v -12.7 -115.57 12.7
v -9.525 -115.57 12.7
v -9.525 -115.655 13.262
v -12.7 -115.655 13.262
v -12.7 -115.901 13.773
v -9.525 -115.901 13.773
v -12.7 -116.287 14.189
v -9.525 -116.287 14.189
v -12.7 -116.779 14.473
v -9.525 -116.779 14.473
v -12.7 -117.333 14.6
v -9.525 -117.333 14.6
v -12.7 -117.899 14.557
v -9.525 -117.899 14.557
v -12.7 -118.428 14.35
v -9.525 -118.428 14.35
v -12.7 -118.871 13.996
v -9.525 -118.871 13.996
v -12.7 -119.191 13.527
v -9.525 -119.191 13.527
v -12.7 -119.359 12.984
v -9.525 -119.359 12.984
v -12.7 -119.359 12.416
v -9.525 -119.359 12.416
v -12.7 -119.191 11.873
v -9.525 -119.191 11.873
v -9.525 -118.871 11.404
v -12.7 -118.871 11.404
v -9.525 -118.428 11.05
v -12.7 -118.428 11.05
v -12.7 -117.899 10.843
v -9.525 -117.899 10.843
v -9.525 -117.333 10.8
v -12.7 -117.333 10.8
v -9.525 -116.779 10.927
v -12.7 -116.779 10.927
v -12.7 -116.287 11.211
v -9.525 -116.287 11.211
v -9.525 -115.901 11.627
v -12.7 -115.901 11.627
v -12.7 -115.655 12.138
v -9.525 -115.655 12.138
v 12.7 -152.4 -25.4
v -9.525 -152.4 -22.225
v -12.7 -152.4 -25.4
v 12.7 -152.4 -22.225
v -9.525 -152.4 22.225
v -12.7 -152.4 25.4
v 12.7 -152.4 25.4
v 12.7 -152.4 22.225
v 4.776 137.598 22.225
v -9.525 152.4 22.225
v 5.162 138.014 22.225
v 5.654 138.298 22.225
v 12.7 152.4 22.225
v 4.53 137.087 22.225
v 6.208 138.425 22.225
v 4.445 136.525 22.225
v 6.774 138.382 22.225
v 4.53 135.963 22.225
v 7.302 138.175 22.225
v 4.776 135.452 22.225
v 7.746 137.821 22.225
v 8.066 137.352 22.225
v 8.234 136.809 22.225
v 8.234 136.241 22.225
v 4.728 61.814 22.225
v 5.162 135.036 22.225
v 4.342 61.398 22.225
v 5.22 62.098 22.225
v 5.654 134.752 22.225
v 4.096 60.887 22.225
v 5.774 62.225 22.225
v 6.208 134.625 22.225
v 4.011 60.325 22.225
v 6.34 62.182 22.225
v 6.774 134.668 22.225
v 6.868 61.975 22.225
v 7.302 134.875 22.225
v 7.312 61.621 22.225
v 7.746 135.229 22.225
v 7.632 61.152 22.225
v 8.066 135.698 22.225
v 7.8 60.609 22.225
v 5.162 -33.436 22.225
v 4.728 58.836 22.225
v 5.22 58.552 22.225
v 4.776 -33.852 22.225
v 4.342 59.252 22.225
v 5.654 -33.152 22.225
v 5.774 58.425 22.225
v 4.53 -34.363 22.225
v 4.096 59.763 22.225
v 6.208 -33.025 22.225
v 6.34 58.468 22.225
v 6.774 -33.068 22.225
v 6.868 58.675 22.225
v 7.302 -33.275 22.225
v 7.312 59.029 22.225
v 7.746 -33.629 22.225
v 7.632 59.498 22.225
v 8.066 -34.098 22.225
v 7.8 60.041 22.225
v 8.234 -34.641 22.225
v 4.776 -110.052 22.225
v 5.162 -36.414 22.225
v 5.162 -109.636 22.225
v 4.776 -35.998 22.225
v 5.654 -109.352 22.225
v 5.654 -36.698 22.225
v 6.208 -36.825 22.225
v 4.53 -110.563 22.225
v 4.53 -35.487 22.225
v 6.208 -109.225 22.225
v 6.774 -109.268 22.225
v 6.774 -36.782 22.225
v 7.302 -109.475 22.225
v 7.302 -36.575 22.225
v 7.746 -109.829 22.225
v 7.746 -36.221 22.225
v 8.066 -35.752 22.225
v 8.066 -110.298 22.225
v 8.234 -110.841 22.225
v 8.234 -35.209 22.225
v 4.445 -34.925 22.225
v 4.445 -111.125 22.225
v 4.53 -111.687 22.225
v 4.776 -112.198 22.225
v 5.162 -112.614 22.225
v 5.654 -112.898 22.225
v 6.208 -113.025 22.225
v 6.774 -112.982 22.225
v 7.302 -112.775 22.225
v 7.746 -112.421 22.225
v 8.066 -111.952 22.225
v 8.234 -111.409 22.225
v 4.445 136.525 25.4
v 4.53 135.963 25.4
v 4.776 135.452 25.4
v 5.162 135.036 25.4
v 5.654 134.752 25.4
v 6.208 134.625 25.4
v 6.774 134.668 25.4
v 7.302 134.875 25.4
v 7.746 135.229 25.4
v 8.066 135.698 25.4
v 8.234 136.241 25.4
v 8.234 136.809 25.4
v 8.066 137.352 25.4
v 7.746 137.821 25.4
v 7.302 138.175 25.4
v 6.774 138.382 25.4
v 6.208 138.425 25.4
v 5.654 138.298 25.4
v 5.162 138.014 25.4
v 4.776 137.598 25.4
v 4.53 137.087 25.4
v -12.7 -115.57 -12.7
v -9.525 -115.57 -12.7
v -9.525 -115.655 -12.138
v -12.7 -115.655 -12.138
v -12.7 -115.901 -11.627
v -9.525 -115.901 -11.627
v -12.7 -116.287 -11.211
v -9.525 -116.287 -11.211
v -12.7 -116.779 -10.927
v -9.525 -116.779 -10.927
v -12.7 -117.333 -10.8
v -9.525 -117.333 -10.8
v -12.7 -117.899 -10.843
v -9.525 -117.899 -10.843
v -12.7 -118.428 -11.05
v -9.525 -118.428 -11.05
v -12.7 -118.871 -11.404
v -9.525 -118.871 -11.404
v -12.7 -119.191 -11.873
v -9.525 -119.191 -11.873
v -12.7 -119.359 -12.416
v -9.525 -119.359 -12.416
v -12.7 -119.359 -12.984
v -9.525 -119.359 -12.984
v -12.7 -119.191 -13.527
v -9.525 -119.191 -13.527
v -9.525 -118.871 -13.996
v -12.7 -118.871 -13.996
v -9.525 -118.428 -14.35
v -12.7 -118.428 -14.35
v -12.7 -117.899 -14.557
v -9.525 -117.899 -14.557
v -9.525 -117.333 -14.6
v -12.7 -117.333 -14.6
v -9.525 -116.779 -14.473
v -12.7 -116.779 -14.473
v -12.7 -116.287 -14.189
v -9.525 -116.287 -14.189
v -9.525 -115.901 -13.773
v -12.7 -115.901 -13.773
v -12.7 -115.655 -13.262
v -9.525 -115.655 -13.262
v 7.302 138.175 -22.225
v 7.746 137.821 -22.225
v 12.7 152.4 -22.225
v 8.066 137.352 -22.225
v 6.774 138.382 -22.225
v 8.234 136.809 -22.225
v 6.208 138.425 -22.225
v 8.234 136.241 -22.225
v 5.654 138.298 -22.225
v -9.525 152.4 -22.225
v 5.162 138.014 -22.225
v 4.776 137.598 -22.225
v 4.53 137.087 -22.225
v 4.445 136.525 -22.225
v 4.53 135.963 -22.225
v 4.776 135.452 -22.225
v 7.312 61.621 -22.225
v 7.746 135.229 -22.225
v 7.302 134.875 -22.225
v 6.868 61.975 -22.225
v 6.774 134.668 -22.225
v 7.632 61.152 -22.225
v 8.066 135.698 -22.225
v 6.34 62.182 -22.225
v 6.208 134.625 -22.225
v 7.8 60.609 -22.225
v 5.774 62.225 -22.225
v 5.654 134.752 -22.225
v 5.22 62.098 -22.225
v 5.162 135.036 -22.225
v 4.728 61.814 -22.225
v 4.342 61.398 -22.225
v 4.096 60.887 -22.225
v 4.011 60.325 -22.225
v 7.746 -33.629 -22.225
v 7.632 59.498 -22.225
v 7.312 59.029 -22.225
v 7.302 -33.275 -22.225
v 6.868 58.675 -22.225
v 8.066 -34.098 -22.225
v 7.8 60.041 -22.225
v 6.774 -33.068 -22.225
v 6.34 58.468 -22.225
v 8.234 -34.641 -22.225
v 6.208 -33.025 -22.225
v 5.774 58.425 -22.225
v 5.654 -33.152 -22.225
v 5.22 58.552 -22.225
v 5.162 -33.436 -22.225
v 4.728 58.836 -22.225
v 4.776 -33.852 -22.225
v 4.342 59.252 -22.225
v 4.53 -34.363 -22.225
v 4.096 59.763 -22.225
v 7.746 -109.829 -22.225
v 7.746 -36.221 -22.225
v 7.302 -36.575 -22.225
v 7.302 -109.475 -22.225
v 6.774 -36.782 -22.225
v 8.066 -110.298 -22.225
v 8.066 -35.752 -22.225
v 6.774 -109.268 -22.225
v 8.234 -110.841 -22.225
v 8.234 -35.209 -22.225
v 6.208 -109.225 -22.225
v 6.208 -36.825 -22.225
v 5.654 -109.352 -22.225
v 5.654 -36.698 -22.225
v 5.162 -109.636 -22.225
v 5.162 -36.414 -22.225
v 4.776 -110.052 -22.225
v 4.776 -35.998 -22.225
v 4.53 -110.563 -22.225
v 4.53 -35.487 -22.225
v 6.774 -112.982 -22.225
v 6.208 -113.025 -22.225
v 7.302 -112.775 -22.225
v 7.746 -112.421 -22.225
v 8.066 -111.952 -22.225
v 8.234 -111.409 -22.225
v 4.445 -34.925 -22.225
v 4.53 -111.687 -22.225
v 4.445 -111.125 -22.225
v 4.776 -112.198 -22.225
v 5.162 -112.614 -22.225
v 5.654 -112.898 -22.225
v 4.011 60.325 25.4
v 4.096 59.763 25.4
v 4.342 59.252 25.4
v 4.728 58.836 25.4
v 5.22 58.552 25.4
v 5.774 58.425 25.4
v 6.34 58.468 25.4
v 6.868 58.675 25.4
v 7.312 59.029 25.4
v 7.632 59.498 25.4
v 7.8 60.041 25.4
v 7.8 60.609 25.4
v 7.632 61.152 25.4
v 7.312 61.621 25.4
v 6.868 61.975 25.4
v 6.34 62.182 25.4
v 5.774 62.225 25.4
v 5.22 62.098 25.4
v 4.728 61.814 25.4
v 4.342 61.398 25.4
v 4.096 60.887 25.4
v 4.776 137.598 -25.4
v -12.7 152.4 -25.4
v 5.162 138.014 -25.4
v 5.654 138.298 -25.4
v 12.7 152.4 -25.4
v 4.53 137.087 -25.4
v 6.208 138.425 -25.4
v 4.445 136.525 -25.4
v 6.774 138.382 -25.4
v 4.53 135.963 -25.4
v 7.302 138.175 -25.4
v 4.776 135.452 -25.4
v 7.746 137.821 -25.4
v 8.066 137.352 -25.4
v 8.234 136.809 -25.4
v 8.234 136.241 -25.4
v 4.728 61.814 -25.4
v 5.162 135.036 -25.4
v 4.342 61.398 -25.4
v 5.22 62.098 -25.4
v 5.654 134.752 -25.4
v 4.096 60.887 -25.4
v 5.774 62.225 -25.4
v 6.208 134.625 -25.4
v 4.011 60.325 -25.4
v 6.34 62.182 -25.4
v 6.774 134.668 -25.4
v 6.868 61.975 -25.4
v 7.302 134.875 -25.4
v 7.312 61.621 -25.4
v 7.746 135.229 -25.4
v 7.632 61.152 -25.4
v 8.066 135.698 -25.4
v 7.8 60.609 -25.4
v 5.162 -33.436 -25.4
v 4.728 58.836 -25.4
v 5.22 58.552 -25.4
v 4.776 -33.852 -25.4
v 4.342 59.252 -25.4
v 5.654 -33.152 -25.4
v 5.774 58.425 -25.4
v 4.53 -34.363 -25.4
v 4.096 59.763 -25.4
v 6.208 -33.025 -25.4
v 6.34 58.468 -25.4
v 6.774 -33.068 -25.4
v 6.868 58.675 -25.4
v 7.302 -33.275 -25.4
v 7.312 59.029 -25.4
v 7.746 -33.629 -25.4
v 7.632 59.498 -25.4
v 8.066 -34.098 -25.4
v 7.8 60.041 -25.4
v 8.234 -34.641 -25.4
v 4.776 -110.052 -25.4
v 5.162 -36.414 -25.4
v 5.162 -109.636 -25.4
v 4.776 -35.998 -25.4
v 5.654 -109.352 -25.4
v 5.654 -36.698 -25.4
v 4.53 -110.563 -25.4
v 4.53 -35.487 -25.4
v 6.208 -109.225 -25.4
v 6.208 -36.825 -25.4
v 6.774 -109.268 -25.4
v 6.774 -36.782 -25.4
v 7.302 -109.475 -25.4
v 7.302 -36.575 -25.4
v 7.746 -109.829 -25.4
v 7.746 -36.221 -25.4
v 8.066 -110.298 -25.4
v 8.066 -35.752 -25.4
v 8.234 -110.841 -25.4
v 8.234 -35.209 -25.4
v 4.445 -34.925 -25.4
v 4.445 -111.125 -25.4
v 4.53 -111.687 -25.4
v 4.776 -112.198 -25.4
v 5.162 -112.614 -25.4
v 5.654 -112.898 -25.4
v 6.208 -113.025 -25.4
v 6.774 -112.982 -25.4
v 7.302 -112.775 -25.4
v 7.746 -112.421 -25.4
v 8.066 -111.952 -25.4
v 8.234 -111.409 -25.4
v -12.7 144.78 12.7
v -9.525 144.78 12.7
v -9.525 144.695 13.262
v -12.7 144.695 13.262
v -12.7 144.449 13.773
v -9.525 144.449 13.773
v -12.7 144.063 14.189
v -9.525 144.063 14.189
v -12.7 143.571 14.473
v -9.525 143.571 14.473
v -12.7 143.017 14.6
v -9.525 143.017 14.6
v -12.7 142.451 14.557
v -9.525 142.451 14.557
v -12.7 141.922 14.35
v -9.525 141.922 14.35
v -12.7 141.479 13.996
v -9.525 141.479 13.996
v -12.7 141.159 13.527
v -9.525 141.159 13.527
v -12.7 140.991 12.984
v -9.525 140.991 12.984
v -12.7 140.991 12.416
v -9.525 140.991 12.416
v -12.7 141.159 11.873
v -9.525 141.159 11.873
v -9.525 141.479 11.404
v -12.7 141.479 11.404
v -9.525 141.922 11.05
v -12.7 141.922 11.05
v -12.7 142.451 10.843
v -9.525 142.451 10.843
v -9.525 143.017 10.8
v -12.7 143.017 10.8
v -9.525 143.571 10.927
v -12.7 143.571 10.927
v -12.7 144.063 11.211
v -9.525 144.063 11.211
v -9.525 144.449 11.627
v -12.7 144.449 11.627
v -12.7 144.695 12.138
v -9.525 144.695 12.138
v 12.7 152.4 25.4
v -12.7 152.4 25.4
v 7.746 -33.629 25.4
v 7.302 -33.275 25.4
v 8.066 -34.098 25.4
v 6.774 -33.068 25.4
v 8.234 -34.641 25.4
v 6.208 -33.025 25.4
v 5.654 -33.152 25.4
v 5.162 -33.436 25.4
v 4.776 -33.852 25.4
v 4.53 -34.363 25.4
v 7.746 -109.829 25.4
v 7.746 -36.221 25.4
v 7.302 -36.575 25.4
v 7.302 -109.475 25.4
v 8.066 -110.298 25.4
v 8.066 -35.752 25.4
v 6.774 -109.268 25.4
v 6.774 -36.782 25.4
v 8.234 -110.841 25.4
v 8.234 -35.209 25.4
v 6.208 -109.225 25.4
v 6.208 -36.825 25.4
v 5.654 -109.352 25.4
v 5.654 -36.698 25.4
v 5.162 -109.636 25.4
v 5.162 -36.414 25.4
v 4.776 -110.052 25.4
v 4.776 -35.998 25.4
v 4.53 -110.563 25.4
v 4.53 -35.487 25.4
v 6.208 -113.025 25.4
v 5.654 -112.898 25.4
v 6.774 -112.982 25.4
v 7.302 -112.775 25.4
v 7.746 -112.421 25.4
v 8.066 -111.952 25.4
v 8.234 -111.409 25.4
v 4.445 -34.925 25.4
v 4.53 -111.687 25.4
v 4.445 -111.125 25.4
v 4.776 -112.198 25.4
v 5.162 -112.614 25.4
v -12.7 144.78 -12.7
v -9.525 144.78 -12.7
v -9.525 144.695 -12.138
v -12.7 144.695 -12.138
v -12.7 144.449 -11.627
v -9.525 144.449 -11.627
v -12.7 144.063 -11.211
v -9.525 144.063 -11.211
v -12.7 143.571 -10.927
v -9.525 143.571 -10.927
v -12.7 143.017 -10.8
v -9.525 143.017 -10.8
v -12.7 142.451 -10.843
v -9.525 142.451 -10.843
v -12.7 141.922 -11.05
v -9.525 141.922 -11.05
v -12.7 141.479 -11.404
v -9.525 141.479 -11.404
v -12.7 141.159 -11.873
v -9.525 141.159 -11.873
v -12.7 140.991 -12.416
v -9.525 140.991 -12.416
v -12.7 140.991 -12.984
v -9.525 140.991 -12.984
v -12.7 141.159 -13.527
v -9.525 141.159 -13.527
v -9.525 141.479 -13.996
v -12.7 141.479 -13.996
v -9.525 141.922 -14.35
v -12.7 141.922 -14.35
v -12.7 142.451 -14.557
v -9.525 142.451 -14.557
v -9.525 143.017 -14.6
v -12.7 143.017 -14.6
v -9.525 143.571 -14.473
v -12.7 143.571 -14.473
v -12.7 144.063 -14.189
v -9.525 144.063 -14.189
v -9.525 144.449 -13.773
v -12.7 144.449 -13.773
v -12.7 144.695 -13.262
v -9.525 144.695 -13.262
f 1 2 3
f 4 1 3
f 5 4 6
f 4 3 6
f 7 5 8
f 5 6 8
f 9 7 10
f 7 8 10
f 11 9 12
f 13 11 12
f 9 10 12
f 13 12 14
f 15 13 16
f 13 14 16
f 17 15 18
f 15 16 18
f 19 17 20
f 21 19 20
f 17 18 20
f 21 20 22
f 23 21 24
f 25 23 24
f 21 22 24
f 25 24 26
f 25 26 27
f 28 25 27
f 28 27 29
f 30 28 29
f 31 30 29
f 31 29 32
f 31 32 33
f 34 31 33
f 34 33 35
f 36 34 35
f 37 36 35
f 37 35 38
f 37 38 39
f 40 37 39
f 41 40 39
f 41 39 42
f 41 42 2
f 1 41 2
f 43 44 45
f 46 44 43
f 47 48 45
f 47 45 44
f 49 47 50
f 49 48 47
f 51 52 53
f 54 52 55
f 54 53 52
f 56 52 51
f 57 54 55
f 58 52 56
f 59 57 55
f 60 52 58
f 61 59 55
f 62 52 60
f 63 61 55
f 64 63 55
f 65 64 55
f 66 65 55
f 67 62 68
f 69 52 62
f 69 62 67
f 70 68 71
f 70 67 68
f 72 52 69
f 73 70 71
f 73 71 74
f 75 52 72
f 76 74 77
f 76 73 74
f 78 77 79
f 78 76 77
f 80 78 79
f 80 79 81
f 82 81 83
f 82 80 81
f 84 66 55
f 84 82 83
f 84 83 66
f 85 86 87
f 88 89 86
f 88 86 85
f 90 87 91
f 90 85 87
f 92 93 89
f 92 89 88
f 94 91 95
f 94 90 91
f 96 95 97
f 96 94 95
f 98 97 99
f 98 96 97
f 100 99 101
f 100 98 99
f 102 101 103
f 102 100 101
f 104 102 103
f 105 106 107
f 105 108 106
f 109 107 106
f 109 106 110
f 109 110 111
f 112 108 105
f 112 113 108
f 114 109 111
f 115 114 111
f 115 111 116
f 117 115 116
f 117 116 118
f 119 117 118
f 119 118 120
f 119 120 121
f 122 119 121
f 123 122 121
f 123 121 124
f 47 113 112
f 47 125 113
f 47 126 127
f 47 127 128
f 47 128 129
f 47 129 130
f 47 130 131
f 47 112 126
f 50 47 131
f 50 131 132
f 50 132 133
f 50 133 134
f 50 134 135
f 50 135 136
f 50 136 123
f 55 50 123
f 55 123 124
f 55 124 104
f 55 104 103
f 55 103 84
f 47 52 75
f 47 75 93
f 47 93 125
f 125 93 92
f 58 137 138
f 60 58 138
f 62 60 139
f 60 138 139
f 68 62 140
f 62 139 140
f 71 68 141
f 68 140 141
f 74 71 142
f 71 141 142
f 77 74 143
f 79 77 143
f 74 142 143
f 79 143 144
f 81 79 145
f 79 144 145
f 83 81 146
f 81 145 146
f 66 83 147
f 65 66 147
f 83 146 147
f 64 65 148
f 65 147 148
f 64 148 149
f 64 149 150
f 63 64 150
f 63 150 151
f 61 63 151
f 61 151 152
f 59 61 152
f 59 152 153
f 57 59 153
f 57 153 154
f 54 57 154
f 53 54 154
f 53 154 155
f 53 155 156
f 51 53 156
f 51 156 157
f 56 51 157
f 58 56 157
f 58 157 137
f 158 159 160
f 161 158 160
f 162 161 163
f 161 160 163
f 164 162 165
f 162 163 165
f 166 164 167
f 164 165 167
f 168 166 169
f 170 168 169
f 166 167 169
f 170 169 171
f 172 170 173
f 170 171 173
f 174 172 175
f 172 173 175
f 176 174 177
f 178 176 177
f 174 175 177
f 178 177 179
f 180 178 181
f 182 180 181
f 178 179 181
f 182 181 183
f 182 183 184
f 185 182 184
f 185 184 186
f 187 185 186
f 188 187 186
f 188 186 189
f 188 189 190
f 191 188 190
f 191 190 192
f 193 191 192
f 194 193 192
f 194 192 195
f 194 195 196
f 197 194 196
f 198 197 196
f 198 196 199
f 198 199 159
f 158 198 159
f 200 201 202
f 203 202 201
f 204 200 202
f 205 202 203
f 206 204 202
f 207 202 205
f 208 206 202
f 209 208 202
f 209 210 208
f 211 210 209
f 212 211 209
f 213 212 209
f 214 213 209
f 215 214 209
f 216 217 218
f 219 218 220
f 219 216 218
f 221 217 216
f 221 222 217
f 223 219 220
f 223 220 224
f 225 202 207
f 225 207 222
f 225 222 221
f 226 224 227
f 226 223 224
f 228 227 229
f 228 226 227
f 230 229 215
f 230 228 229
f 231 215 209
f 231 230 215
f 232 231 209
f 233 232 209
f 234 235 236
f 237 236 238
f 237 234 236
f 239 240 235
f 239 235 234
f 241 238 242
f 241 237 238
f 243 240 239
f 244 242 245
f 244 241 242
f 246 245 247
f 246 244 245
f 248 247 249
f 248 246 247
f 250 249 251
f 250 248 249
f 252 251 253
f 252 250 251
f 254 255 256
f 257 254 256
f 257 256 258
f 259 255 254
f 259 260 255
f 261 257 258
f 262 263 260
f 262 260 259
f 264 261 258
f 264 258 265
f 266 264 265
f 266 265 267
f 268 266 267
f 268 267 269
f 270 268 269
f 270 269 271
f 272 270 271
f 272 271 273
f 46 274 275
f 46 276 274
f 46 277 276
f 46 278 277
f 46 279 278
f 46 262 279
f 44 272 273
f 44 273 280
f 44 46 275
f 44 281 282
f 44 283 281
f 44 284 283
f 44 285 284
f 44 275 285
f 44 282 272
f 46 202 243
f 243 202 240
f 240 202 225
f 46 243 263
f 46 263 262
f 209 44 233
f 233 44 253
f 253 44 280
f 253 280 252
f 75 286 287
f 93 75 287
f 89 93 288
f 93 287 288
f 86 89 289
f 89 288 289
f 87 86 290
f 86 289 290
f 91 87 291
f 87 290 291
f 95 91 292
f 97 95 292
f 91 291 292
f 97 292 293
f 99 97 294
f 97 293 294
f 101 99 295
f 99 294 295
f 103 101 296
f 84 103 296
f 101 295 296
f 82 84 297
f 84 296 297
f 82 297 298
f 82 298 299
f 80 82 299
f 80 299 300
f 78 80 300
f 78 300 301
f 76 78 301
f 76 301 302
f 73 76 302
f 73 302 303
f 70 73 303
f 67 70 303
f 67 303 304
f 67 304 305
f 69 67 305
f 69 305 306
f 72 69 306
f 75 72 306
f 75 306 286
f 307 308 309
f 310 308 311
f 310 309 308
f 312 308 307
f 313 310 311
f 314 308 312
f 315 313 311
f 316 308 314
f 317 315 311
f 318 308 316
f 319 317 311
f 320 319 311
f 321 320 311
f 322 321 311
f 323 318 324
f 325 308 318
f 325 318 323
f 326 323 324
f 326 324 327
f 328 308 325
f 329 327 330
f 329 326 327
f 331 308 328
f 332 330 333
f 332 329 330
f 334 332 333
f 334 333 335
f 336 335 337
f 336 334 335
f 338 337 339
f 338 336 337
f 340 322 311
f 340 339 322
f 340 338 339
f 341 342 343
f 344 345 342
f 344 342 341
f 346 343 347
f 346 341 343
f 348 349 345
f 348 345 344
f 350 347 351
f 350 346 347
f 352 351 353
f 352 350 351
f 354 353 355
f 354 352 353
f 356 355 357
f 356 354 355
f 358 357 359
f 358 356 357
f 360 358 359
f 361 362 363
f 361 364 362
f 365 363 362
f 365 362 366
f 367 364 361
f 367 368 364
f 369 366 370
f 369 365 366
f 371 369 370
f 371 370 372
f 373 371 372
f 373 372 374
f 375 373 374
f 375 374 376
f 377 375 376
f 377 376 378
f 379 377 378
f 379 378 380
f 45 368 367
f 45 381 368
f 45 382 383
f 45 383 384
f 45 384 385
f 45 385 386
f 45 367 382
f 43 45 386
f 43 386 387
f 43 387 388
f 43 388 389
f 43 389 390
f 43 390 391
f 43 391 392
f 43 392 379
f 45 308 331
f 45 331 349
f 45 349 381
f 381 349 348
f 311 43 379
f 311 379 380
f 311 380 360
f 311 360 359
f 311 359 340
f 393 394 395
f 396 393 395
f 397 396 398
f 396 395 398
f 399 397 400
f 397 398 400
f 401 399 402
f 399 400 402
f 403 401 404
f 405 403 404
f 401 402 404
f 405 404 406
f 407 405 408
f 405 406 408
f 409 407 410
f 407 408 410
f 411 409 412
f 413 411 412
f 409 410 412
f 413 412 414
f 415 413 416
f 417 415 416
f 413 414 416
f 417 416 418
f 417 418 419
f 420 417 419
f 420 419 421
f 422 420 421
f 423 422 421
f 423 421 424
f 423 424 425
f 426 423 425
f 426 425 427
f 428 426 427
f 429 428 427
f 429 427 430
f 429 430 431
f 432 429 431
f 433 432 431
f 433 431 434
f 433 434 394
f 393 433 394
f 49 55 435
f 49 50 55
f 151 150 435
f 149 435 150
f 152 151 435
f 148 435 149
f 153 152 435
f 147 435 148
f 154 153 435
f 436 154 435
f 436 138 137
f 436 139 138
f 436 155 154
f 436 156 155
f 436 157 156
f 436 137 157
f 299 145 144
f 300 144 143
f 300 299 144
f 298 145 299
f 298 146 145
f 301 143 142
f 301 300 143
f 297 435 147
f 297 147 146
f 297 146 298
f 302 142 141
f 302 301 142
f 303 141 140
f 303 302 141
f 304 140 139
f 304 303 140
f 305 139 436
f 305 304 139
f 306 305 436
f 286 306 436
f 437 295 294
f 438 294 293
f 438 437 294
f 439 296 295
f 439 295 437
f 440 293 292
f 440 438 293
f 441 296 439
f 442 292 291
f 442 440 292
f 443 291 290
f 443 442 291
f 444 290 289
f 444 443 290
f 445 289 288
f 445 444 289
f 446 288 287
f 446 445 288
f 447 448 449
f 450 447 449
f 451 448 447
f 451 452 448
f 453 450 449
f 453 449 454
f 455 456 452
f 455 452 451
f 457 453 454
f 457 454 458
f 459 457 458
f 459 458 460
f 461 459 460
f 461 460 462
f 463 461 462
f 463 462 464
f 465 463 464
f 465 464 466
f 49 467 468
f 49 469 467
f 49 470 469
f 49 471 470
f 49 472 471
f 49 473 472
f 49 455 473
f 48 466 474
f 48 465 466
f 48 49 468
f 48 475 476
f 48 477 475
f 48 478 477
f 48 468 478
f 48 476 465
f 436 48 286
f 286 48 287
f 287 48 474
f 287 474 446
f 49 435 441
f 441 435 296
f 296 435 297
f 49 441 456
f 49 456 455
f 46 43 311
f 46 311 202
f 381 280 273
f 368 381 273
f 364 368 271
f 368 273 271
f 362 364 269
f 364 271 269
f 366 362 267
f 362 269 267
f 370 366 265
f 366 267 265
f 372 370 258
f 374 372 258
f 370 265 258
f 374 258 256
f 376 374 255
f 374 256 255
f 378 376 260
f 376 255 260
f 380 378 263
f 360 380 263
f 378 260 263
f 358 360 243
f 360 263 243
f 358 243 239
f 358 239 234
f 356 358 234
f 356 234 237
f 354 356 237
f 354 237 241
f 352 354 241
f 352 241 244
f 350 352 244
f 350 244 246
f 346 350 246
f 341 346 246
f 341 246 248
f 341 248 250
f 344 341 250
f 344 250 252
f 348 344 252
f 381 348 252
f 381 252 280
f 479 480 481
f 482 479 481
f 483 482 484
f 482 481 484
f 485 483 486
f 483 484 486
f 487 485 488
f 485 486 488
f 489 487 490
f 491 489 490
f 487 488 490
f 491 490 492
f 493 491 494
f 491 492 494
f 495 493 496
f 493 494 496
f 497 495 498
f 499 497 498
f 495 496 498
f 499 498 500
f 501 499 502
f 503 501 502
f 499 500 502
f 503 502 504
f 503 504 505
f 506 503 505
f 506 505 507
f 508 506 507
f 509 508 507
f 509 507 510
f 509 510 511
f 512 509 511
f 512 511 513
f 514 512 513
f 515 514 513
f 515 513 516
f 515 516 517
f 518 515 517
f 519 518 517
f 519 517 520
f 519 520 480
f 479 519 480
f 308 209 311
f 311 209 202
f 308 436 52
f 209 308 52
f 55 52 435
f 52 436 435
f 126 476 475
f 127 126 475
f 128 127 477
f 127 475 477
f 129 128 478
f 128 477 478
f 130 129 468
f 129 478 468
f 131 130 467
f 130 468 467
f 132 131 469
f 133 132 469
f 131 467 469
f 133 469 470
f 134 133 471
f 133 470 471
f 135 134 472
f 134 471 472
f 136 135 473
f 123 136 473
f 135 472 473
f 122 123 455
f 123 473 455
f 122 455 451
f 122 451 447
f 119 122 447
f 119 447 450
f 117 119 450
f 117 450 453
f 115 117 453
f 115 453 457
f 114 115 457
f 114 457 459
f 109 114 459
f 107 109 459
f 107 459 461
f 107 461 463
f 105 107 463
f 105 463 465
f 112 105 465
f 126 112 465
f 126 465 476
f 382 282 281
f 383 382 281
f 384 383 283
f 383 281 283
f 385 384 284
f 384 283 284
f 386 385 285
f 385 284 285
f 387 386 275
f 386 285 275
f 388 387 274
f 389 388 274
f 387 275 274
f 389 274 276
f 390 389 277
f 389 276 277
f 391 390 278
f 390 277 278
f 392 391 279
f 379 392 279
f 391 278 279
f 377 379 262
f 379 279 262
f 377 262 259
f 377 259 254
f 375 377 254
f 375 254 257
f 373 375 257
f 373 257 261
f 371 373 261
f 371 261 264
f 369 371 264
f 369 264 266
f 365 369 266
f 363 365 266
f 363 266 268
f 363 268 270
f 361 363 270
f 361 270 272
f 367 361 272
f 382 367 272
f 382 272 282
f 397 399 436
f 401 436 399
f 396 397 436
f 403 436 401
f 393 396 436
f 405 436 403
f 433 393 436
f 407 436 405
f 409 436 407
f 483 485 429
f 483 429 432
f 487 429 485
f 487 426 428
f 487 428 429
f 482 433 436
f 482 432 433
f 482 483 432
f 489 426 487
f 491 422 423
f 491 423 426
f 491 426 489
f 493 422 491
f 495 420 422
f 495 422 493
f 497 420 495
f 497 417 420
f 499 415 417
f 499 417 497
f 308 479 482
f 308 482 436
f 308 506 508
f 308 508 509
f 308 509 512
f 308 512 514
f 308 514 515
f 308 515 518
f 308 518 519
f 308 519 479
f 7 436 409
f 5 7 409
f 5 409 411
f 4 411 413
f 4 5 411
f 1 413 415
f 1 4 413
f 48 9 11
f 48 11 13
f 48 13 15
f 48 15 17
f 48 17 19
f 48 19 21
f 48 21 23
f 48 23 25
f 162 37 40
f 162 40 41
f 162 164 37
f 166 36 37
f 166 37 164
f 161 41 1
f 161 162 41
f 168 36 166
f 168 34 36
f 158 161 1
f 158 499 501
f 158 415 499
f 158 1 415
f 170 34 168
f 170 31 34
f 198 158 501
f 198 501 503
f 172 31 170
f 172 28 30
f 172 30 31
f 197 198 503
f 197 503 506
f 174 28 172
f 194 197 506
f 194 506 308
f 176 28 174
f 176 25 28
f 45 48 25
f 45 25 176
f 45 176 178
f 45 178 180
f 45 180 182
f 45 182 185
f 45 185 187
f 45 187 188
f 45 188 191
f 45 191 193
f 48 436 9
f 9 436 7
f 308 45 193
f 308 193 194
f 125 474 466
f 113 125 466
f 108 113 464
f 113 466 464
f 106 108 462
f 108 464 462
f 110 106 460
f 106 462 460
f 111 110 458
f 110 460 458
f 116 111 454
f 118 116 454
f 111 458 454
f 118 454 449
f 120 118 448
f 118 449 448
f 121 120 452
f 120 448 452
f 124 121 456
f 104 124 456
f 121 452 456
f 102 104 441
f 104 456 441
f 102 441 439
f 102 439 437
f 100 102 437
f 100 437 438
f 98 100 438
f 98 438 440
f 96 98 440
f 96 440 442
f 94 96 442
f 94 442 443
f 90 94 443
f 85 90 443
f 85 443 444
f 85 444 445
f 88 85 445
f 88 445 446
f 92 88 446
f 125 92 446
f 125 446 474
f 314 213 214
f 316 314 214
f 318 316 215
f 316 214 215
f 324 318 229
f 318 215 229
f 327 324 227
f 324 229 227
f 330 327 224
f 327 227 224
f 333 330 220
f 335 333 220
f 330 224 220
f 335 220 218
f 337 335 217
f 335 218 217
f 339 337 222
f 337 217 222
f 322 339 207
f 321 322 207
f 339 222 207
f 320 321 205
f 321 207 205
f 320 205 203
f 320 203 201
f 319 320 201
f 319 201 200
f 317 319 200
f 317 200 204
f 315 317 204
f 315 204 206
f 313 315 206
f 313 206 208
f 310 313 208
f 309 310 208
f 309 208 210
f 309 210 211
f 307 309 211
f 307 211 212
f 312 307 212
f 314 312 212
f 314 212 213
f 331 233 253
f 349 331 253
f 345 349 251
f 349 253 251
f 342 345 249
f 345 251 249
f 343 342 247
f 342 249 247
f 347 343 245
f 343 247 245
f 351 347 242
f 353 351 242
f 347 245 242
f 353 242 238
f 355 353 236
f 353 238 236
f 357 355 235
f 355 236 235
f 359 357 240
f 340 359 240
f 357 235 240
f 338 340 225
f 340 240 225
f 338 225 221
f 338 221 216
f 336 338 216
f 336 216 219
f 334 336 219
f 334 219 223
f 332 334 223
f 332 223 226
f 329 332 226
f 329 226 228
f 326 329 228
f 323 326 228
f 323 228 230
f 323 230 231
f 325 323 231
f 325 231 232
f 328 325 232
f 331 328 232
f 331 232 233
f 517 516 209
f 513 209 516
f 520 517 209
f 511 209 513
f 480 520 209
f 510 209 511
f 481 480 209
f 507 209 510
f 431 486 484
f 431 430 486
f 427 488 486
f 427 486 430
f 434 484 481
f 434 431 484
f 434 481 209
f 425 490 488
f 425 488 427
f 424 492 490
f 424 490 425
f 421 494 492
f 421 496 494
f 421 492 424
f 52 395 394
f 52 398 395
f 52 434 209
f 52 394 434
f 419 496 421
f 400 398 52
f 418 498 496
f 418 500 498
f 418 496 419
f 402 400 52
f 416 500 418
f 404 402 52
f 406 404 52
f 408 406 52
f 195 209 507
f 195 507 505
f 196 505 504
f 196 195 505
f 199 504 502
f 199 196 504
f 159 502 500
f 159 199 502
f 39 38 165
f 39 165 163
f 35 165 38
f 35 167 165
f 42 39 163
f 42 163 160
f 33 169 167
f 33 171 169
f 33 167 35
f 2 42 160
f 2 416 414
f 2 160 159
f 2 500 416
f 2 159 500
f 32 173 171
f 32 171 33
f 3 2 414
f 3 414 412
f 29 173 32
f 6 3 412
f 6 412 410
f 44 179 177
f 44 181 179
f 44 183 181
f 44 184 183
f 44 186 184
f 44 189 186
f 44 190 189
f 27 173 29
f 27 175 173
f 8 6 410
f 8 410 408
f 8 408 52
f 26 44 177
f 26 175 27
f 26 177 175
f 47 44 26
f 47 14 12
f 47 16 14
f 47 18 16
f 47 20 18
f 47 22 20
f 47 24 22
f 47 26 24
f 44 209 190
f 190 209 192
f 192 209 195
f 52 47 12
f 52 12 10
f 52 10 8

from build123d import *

# Parameters (mm, degrees)
F1_DEPTH = 152.4
F3_D     = 3.81
F5_D     = 3.81


with BuildPart() as f1:
    # F0 (on Front) → F1 (new body, symmetric)
    with BuildSketch(Plane.XZ):
        Polygon((12.7, 25.4), (-12.7, 25.4), (-12.7, -25.4), (12.7, -25.4), (12.7, -22.225), (-9.525, -22.225), (-9.525, 22.225), (12.7, 22.225), align=None)
    extrude(amount=F1_DEPTH, both=True)

    # F3 (through all)
    with Locations(Plane(origin=(0, 0, -25.4), x_dir=(1, 0, 0), z_dir=(0, 0, -1))):
        with Locations((6.35, -136.525), (5.915893, -60.325), (6.35, 34.925), (6.35, 111.125)):
            Hole(F3_D / 2)

    # F5 (through all)
    with Locations(Plane(origin=(-12.7, 0, 0), x_dir=(0, -1, 0), z_dir=(-1, 0, 0))):
        with Locations((117.475, -12.7), (117.475, 12.7), (-142.875, -12.7), (-142.875, 12.7)):
            Hole(F5_D / 2)


solid = f1.part
